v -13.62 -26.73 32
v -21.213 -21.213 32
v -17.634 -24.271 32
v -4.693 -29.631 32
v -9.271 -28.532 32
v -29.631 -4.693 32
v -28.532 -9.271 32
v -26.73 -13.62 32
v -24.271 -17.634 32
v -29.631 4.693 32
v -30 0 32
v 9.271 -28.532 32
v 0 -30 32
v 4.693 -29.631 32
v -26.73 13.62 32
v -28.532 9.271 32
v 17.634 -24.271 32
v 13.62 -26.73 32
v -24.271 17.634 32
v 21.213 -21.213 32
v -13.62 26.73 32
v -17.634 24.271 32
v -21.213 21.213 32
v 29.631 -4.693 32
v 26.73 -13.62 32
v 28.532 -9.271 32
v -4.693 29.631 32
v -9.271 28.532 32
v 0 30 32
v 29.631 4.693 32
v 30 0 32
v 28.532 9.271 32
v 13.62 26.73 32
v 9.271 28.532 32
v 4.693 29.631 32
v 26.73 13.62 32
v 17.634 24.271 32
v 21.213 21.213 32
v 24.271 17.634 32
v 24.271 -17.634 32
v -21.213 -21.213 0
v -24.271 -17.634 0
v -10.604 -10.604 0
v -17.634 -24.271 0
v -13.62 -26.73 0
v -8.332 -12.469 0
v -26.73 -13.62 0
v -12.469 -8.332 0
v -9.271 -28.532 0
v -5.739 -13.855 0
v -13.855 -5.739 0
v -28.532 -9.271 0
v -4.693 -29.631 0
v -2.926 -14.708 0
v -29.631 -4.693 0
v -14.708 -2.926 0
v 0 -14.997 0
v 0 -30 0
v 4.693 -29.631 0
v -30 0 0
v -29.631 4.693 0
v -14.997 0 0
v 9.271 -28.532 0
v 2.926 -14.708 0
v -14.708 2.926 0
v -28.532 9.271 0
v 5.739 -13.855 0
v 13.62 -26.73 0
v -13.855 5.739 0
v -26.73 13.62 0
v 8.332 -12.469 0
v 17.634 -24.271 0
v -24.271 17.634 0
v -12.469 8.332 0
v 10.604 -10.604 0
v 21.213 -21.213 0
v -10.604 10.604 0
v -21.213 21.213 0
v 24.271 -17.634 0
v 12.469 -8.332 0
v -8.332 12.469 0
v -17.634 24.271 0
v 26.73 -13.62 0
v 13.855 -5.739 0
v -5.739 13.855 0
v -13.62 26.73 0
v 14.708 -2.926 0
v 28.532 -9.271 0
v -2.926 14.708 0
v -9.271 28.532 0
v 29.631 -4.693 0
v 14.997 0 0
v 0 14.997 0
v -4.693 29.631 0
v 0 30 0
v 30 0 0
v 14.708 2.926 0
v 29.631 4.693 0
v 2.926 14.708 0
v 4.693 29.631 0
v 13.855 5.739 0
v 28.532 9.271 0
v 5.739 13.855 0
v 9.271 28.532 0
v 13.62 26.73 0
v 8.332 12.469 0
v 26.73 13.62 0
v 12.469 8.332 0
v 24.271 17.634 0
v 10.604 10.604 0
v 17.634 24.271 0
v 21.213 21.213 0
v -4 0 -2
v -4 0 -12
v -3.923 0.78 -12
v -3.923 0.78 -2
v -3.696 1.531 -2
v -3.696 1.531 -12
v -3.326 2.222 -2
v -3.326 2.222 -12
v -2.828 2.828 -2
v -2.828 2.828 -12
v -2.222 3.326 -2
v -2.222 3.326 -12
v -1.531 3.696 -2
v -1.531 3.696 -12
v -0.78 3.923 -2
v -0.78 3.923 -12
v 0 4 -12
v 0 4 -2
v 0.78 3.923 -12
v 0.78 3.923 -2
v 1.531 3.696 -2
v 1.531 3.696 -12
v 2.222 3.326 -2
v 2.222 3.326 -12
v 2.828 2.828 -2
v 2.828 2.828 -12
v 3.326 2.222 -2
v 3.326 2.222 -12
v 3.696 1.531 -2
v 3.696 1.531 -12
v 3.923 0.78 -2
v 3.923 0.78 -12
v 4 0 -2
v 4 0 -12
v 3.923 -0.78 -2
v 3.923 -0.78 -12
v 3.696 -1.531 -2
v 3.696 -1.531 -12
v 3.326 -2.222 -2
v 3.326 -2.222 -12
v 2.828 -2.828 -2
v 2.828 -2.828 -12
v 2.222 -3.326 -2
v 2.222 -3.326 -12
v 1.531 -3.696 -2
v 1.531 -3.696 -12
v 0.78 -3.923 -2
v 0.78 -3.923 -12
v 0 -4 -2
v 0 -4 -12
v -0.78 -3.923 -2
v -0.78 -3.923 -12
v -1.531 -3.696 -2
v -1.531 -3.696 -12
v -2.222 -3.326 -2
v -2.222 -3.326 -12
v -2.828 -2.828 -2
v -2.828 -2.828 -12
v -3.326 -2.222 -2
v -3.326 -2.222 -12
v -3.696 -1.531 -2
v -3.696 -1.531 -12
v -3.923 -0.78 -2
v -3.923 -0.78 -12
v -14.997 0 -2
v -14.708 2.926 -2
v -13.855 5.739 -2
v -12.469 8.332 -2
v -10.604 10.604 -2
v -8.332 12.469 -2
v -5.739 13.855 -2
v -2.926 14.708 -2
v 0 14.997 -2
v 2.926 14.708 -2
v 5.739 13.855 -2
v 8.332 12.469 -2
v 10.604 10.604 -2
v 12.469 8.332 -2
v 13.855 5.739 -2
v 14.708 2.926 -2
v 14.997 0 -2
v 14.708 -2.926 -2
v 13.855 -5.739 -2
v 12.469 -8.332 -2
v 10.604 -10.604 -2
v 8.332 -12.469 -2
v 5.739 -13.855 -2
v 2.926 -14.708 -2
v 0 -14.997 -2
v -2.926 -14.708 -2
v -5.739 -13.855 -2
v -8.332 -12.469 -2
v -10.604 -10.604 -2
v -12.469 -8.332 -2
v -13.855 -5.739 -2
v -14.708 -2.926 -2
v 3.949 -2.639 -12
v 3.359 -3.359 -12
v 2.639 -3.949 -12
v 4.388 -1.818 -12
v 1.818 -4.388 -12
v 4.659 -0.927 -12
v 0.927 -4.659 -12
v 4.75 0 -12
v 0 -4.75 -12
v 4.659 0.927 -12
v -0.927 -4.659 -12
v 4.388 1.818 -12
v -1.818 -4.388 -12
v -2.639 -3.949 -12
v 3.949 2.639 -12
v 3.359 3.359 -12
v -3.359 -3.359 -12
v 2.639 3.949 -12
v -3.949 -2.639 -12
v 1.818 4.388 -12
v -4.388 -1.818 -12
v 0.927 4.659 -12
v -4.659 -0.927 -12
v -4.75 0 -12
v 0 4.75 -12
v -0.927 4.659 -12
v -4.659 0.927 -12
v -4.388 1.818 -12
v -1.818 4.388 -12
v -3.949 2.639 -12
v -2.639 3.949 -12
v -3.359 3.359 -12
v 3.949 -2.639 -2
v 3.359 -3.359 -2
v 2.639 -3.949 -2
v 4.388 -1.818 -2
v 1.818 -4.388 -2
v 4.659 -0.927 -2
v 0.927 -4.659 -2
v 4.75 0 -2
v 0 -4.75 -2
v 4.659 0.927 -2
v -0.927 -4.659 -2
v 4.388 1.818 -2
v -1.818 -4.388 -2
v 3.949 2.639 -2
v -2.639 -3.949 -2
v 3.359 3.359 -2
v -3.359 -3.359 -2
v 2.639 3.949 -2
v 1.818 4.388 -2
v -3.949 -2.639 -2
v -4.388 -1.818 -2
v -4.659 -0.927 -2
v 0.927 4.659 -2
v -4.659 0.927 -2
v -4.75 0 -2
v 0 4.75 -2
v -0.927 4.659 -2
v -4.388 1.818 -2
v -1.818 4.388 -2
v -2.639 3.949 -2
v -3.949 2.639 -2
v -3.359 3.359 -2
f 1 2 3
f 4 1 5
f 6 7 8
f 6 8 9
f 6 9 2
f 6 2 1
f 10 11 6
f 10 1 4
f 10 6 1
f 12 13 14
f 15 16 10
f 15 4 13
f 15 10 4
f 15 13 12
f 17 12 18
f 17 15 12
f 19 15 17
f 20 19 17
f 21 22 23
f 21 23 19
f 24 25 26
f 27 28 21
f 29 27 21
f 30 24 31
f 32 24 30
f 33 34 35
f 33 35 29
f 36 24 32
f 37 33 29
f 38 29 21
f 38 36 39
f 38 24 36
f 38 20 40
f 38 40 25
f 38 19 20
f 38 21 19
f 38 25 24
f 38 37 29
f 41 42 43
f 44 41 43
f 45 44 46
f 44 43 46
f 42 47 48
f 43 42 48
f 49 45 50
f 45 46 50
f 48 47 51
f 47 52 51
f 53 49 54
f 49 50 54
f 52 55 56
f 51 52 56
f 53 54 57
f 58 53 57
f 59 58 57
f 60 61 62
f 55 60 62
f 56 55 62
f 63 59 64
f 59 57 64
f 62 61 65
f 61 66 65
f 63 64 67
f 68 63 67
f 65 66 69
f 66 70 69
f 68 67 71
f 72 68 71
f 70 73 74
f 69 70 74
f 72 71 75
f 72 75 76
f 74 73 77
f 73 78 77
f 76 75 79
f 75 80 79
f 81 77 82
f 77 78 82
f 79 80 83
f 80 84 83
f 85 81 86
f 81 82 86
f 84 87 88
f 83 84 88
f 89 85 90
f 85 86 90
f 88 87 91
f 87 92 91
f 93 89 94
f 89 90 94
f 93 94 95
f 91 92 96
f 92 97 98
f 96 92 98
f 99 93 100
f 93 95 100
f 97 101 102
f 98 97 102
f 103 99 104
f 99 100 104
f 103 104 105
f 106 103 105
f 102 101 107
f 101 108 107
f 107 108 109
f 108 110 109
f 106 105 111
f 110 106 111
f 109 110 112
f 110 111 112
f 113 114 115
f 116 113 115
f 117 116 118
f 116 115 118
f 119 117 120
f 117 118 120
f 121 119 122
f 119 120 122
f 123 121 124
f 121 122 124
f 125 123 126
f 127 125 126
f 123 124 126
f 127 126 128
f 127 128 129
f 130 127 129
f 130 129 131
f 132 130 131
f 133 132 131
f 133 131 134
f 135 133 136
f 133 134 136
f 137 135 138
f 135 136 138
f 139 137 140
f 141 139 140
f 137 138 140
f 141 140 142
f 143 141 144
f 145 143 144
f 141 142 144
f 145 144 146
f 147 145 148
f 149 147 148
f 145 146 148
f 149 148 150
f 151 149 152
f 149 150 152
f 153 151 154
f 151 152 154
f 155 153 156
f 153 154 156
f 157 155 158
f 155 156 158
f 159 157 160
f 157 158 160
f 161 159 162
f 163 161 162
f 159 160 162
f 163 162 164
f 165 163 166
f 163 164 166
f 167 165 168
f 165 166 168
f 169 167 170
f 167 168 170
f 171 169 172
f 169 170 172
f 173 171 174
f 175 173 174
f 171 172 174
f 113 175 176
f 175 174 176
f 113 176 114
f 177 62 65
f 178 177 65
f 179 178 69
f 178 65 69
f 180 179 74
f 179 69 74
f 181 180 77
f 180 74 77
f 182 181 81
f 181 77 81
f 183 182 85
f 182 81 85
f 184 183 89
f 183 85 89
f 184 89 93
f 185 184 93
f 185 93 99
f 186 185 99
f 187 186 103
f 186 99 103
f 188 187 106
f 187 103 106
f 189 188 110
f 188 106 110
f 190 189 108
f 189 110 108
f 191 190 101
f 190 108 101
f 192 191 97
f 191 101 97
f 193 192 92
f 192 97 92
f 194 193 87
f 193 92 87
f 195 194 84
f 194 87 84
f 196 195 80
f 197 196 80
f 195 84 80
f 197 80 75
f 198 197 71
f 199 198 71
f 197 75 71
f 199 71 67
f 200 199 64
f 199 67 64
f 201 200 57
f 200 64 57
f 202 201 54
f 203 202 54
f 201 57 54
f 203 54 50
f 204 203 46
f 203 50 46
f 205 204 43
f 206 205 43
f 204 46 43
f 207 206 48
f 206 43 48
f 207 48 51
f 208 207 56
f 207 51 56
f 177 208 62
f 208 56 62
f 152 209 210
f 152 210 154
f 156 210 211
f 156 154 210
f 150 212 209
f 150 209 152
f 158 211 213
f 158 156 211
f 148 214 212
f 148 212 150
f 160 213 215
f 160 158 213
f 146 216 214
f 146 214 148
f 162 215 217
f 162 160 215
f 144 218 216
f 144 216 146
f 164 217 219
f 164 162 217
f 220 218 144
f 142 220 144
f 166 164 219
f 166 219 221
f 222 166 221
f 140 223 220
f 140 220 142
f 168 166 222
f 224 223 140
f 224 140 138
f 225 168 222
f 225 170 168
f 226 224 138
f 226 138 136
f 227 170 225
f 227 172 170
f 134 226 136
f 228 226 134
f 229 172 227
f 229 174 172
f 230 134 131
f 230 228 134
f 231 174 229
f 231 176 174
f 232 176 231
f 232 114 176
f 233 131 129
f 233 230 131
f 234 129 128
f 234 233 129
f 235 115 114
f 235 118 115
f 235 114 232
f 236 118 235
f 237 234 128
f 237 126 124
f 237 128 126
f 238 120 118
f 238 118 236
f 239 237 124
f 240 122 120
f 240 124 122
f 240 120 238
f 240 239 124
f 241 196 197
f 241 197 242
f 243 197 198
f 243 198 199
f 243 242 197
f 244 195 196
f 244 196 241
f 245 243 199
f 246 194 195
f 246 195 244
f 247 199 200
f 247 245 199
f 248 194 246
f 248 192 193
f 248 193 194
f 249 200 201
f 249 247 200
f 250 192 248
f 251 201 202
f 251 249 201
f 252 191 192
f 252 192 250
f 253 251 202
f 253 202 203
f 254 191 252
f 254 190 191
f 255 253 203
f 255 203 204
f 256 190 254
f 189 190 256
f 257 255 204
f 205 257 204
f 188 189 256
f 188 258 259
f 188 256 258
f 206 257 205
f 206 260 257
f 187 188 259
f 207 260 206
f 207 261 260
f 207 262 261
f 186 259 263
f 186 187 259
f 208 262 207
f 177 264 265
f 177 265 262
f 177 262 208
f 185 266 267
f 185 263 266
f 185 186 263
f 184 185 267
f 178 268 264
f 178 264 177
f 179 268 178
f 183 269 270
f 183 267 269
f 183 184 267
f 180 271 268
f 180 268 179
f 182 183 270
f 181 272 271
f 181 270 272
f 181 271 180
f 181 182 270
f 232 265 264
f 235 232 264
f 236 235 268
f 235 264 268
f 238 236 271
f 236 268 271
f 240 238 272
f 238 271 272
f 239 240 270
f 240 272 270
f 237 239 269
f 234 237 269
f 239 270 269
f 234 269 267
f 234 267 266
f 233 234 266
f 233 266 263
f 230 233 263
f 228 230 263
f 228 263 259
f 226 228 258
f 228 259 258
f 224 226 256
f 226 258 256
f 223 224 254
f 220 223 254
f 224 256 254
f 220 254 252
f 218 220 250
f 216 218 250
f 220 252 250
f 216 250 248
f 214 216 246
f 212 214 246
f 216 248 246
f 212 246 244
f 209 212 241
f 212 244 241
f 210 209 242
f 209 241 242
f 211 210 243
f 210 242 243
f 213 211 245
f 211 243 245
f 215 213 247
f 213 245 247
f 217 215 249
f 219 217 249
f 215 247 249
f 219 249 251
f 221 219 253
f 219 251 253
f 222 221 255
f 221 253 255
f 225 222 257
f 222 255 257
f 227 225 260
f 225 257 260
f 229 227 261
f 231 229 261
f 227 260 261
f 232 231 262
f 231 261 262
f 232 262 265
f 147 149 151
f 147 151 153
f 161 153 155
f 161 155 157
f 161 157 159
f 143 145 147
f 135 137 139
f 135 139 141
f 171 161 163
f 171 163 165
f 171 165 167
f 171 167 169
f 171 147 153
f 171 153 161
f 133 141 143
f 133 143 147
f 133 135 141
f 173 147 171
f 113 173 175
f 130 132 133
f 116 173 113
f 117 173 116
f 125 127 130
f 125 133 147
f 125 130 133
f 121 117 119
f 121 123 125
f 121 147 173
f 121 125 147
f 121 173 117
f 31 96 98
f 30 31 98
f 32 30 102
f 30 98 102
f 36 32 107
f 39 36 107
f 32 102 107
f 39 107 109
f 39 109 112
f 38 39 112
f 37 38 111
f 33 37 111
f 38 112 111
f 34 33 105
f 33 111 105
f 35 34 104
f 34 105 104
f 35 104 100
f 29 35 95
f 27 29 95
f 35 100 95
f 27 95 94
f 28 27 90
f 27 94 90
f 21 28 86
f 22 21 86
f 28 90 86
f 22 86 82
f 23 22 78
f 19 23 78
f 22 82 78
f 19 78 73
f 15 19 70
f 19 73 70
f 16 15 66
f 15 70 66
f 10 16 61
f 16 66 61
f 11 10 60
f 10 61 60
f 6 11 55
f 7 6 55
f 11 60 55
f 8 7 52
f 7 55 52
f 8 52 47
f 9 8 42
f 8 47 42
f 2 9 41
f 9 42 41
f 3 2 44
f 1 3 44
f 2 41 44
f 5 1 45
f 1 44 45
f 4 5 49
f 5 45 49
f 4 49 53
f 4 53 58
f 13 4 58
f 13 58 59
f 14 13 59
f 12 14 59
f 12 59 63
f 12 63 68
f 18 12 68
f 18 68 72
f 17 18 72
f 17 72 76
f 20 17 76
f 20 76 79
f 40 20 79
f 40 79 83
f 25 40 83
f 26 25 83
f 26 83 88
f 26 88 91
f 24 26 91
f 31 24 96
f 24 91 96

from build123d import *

# Parameters (mm, degrees)
SKIZZE1_R                       = 30
AUFSATZ_LINEAR_AUSTRAGEN1_DEPTH = 32
SKIZZE2_R                       = 14.996636578
AUFSATZ_LINEAR_AUSTRAGEN2_DEPTH = 2
SKIZZE3_R                       = 4.75
AUFSATZ_LINEAR_AUSTRAGEN3_DEPTH = 10
SKIZZE4_R                       = 4
SCHNITT_LINEAR_AUSTRAGEN1_DEPTH = 10


with BuildPart() as part:
    # Skizze1 → Aufsatz-Linear austragen1 (new body)
    with BuildSketch(Plane.XY):
        Circle(SKIZZE1_R)
    extrude(amount=AUFSATZ_LINEAR_AUSTRAGEN1_DEPTH)

    # Skizze2 → Aufsatz-Linear austragen2 (add)
    with BuildSketch(Plane(origin=(0, 0, 0), x_dir=(-1, 0, 0), z_dir=(0, 0, -1))):
        Circle(SKIZZE2_R)
    extrude(amount=AUFSATZ_LINEAR_AUSTRAGEN2_DEPTH)

    # Skizze3 → Aufsatz-Linear austragen3 (add)
    with BuildSketch(Plane(origin=(0, 0, -2), x_dir=(-1, 0, 0), z_dir=(0, 0, -1))):
        Circle(SKIZZE3_R)
    extrude(amount=AUFSATZ_LINEAR_AUSTRAGEN3_DEPTH)

    # Skizze4 → Schnitt-Linear austragen1 (cut)
    with BuildSketch(Plane(origin=(0, 0, -12), x_dir=(-1, 0, 0), z_dir=(0, 0, -1))):
        Circle(SKIZZE4_R)
    extrude(amount=-SCHNITT_LINEAR_AUSTRAGEN1_DEPTH, mode=Mode.SUBTRACT)


solid = part.part
